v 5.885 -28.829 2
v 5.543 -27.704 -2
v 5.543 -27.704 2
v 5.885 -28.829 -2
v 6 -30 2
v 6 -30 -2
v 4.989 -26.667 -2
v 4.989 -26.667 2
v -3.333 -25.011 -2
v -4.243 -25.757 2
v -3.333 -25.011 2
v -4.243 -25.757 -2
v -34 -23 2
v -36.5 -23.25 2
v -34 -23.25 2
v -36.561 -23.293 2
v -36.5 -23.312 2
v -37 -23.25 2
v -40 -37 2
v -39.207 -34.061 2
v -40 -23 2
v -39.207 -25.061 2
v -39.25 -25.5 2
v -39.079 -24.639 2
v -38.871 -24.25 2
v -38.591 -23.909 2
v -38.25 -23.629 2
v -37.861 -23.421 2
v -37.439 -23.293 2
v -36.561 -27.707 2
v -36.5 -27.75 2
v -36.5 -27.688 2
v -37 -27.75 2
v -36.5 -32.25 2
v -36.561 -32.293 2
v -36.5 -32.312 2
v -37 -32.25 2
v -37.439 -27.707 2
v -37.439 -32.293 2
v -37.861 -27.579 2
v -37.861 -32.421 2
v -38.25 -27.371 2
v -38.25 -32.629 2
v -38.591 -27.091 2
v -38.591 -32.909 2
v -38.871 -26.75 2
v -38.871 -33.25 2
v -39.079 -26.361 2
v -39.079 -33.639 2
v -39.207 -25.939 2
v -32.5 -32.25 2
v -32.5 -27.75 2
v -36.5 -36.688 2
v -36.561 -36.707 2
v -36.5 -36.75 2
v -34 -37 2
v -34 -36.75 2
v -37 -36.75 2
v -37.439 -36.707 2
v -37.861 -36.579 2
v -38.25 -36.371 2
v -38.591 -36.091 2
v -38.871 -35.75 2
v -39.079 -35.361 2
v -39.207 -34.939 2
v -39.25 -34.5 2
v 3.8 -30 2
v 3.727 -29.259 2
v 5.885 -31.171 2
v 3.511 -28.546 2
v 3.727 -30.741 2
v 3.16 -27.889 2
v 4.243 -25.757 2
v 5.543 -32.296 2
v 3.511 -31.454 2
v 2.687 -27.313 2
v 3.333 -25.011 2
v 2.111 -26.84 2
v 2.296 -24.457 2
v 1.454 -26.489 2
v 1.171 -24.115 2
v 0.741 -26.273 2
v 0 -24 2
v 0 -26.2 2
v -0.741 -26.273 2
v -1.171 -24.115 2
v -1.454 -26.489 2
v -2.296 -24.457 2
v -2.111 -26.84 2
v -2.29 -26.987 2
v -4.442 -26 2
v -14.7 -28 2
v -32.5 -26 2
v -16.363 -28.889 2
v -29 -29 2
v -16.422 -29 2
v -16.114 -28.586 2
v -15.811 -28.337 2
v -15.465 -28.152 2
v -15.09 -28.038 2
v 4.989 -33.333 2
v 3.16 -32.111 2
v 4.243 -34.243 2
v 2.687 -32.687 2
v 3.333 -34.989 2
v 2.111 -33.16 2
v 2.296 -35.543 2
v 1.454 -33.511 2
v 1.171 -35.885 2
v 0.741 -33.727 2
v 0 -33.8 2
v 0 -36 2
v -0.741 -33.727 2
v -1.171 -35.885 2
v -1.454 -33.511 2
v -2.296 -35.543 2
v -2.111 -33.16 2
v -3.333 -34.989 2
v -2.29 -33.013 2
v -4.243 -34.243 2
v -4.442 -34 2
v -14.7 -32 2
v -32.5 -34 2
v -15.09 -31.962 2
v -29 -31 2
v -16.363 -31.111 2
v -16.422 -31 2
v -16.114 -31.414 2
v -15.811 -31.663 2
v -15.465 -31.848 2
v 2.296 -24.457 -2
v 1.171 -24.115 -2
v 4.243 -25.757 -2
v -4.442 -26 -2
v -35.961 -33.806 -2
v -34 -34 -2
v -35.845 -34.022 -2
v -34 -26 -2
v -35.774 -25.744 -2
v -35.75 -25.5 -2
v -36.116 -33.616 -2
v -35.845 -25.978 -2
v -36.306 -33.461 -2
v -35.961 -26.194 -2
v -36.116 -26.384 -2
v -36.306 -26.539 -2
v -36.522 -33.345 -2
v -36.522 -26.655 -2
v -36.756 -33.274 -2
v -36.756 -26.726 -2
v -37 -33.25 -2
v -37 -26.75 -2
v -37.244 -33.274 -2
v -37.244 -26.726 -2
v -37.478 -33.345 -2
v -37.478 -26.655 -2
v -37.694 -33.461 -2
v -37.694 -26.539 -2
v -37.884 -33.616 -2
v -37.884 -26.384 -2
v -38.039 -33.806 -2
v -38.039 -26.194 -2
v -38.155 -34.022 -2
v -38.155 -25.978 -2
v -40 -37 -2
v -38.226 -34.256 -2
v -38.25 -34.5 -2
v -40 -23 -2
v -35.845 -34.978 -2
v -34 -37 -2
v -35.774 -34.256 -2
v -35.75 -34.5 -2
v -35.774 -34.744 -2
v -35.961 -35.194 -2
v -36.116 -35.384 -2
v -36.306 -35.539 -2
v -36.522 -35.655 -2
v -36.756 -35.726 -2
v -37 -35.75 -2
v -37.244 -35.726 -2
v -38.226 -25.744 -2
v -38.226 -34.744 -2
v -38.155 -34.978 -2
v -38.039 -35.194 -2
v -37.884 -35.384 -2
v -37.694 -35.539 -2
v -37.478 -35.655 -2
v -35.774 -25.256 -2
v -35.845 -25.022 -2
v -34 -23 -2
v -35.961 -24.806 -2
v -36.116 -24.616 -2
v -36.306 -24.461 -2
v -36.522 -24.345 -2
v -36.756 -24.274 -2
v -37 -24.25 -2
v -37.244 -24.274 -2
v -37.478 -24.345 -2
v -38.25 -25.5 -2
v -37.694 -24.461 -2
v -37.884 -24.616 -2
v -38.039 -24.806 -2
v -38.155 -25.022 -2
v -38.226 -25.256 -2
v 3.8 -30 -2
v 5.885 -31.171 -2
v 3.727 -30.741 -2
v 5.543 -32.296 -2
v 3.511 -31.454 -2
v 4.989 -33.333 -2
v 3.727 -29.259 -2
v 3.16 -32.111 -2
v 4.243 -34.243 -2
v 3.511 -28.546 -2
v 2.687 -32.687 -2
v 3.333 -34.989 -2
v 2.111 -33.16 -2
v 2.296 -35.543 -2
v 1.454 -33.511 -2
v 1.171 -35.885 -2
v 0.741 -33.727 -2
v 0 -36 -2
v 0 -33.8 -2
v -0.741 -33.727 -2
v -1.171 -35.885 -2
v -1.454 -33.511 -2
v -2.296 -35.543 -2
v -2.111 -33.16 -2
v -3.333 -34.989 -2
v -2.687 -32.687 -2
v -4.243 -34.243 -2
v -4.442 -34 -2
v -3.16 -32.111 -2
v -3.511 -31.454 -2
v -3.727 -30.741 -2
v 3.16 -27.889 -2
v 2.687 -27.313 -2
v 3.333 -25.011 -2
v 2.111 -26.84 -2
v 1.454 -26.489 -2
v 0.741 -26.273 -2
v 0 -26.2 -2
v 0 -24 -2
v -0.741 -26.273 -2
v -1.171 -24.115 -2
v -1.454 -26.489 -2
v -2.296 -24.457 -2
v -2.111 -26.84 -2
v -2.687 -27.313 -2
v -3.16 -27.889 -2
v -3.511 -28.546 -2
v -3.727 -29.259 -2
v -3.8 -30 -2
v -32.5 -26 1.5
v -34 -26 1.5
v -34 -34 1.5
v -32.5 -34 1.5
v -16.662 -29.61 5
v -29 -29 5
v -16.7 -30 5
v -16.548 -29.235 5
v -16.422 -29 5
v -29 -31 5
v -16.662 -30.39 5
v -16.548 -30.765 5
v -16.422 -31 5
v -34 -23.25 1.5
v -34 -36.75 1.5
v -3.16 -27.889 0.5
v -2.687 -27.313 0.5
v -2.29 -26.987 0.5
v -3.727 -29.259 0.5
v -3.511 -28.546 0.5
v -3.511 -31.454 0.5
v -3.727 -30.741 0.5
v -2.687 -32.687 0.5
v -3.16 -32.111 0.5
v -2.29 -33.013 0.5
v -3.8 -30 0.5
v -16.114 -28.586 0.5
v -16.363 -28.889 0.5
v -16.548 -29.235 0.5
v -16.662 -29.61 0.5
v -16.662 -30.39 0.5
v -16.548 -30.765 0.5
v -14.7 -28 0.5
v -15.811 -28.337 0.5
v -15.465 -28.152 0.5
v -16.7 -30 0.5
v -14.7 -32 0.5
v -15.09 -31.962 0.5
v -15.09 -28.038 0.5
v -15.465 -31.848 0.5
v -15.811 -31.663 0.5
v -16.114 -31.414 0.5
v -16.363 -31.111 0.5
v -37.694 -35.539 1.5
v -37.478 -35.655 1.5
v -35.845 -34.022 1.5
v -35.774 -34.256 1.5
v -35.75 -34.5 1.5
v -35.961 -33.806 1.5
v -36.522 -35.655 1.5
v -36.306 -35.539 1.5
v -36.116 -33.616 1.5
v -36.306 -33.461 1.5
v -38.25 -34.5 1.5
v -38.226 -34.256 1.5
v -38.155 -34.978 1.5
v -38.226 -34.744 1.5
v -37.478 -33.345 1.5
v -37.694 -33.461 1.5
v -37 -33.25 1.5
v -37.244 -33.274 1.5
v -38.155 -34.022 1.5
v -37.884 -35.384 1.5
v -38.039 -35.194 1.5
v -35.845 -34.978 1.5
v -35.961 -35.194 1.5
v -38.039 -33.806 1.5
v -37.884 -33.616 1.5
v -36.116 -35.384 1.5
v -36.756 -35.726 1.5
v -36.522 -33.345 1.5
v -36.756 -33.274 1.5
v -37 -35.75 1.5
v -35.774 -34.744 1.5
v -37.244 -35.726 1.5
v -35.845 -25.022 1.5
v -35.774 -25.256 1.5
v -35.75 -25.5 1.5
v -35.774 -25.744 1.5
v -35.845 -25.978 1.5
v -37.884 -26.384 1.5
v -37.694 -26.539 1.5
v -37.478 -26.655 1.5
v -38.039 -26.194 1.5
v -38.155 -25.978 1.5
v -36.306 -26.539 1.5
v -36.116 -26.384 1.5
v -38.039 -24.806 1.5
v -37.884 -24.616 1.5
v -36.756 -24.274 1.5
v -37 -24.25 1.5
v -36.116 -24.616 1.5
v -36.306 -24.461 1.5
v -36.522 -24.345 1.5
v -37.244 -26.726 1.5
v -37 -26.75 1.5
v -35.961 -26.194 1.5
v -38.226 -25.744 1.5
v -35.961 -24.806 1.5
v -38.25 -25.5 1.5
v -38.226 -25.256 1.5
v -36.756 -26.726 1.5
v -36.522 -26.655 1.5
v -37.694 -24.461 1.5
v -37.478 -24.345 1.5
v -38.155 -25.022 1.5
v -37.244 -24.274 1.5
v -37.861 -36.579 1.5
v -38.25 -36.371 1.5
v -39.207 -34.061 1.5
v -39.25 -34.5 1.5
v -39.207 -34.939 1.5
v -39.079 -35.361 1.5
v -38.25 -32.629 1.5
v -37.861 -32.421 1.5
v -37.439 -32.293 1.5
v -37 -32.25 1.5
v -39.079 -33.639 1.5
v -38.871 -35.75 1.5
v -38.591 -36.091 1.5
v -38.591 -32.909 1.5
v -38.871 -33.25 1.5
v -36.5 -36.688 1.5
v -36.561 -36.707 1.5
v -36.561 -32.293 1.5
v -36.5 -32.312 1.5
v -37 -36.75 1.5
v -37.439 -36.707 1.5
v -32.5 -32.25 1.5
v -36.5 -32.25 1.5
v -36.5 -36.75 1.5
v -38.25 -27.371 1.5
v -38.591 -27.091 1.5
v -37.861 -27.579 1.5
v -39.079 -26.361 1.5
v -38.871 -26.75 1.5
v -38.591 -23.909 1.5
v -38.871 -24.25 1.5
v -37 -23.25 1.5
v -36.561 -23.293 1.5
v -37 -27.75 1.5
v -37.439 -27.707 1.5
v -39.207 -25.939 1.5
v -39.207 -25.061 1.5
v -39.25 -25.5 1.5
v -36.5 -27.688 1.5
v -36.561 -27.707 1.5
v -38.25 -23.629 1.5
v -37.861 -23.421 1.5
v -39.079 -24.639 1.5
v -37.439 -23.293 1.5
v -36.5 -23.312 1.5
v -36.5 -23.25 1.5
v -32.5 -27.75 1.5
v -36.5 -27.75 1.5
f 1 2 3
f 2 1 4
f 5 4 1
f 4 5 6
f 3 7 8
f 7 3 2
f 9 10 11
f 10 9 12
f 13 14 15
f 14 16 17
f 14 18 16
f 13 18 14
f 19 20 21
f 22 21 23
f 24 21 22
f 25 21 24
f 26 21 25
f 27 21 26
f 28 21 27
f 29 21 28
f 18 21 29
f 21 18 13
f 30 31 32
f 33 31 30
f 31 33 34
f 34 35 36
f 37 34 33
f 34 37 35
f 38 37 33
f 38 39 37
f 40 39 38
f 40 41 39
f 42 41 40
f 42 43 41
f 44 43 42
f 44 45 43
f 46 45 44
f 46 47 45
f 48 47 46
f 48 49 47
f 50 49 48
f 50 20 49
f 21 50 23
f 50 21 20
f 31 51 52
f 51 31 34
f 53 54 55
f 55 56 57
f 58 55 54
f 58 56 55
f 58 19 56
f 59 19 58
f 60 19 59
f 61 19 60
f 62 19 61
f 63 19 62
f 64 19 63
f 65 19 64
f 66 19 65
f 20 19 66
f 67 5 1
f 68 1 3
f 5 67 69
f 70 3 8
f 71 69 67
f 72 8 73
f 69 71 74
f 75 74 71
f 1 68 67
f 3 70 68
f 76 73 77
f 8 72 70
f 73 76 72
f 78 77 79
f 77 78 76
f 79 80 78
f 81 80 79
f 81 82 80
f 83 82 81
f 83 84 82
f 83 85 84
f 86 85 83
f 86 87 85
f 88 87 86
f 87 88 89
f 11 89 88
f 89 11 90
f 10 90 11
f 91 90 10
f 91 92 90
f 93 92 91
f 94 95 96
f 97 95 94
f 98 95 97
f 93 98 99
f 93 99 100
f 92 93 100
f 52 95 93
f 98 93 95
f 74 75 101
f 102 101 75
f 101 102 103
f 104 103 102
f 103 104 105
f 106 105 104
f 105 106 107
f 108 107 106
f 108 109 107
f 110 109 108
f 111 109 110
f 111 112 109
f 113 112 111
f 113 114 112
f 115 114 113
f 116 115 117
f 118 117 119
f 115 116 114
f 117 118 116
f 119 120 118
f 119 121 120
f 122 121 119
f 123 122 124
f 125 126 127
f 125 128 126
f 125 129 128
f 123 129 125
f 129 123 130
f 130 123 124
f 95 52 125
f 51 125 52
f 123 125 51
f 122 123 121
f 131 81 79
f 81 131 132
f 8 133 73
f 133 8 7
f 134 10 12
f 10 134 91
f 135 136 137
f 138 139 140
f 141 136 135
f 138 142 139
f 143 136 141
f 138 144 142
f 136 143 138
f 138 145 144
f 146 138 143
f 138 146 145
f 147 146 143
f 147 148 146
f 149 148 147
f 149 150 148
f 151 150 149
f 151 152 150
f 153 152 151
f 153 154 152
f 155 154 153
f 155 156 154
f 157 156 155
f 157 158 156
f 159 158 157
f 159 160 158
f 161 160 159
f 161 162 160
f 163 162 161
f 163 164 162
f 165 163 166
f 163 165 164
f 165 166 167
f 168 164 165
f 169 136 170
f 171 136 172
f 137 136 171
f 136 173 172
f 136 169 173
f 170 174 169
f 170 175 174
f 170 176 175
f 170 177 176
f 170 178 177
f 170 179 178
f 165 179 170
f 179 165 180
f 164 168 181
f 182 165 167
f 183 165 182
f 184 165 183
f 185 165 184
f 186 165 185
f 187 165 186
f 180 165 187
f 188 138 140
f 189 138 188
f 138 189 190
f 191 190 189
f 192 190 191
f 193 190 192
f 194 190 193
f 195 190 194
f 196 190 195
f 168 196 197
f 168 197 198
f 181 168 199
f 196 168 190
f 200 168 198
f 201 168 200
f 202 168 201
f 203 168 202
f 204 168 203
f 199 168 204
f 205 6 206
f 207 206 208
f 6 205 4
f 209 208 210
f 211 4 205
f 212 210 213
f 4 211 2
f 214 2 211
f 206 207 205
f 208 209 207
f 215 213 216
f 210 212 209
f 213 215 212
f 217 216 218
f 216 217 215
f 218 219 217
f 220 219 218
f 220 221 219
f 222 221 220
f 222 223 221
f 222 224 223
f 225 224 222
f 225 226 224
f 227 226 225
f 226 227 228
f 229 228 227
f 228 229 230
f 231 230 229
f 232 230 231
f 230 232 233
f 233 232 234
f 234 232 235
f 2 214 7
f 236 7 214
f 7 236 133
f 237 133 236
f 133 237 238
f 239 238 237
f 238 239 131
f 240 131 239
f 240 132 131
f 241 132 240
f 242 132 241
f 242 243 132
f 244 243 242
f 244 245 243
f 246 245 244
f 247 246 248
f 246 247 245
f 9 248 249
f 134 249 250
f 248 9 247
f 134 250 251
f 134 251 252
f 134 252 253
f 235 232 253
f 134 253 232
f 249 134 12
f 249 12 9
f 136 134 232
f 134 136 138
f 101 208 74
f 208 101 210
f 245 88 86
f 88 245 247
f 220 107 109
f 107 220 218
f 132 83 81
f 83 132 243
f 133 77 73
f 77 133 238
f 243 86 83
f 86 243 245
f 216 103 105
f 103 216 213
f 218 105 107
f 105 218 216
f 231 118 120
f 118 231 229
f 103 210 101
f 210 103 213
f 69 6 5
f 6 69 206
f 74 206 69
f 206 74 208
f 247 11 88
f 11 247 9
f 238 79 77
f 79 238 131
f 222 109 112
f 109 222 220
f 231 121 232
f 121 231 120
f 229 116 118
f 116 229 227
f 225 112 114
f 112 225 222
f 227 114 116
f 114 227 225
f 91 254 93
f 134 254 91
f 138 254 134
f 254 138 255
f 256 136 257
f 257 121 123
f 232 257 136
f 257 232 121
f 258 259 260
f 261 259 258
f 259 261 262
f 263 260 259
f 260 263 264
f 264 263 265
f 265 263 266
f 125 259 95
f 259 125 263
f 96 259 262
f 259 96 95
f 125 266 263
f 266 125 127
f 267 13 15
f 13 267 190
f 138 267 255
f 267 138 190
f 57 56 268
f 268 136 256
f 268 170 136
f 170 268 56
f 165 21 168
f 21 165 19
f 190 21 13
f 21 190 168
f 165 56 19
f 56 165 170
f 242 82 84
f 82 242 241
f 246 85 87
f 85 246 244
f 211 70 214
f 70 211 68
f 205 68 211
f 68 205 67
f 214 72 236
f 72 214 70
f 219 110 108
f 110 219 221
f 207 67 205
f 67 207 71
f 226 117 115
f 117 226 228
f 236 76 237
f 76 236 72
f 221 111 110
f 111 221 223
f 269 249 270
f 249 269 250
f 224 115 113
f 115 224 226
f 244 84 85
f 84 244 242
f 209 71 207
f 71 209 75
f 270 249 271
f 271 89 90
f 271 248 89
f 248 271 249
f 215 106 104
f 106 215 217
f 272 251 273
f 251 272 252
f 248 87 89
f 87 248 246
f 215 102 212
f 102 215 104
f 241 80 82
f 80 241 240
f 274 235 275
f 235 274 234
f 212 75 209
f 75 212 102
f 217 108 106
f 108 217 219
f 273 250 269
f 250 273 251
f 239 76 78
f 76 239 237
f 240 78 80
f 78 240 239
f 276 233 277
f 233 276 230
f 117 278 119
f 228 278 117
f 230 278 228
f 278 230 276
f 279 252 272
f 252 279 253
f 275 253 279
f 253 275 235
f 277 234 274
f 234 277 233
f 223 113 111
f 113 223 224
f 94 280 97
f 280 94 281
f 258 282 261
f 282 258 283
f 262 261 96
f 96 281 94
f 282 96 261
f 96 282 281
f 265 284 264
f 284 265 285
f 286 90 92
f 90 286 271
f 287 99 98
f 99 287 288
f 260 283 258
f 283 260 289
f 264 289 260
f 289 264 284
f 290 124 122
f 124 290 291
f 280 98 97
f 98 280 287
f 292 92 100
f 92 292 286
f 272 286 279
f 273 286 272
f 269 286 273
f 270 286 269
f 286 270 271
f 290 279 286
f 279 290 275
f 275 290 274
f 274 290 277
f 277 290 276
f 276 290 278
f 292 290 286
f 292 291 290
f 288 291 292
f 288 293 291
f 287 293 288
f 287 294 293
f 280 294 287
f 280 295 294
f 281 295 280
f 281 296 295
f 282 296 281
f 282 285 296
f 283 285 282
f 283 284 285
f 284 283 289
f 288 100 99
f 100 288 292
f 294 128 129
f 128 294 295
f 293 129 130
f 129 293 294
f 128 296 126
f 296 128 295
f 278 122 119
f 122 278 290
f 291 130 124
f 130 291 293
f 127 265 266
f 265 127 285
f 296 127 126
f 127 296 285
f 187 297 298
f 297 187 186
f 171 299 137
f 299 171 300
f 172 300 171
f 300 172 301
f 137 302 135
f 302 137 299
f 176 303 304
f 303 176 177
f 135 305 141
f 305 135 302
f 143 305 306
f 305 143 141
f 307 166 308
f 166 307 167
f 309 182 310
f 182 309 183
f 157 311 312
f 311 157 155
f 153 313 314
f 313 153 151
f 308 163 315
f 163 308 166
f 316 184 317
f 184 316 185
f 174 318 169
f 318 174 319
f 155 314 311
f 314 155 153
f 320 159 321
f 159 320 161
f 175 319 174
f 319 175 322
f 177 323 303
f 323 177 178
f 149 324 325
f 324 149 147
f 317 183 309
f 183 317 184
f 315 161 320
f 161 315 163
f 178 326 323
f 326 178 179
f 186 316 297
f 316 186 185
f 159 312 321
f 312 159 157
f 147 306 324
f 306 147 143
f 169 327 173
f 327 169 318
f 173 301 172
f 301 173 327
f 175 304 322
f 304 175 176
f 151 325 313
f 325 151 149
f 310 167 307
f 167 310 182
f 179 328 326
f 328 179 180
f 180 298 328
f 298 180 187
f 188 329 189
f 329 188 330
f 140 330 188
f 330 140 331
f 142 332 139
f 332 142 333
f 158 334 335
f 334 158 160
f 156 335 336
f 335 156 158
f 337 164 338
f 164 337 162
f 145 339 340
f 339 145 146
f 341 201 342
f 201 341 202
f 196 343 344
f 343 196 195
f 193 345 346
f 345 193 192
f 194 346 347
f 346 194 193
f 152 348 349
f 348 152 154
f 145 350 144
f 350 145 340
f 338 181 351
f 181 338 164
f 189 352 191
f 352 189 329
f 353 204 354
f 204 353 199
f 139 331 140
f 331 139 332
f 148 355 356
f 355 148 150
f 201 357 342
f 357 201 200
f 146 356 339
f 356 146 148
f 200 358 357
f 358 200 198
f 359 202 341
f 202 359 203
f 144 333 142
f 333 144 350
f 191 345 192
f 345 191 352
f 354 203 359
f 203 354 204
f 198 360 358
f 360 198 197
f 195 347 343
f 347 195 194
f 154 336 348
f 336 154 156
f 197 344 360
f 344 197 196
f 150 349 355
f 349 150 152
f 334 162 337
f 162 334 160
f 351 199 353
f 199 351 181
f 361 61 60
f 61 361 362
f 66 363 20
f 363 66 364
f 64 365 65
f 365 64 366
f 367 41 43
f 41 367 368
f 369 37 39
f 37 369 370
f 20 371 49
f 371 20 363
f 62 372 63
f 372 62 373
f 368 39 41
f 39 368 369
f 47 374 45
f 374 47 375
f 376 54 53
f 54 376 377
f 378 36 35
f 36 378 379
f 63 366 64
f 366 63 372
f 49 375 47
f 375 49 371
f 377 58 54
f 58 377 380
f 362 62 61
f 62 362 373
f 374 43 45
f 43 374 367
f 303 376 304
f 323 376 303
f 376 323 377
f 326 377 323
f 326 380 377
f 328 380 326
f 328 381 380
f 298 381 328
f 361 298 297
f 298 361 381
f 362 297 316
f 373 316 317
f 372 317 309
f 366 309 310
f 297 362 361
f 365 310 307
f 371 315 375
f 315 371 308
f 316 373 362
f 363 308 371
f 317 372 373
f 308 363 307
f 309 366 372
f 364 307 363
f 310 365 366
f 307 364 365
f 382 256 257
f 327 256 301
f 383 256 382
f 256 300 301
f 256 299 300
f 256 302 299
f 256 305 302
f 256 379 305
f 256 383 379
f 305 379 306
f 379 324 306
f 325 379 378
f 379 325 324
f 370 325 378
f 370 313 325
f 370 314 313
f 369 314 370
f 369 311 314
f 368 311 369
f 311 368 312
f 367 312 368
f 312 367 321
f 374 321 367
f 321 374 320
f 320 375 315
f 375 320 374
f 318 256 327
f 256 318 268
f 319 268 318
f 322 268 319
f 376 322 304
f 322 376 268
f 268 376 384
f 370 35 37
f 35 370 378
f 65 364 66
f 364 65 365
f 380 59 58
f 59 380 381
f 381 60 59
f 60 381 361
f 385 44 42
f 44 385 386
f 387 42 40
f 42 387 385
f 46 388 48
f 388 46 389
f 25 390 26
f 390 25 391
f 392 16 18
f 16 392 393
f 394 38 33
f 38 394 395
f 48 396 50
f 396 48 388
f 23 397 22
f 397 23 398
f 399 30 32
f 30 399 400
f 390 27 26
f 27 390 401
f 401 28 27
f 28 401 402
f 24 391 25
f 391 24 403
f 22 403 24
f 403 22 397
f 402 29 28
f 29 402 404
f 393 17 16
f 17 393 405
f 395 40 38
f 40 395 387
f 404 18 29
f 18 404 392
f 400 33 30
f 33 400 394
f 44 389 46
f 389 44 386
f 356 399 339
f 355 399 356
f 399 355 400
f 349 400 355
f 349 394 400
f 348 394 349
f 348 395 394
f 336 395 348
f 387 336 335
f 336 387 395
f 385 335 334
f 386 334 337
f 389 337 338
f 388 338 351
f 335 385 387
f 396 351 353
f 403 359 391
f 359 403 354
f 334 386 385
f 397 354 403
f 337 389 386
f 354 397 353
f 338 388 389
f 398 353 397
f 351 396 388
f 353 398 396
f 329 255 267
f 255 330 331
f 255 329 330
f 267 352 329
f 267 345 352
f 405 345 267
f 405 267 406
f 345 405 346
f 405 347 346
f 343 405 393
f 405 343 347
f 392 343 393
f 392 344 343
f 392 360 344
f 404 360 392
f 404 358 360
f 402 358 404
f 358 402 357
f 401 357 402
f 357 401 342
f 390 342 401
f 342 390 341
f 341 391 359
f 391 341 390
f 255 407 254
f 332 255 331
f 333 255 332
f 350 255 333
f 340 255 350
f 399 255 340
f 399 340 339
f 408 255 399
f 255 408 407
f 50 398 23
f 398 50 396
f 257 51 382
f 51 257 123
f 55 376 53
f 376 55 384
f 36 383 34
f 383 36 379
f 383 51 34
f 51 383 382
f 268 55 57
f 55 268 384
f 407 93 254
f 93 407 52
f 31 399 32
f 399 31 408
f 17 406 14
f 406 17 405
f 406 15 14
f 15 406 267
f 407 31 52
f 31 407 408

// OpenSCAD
//-- limit switch holder / servo arm extender for Auto Bed Leveling
//-- by AndrewBCN - Barcelona, Spain - November 2014
//-- GPLV3
//-- (armv3 below)

//-- remix of Thingiverse #167430 (armv1 below)
//-- by zennmaster

//-- remix of Thingiverse #209384 (armv2 below)
//-- by Stephen Castello

// Some measurements and features

// armv1 has a (fixed) length of 37mm,
// width is 10mm, thickness is 4mm,
// uses 2 x M2.5 screws and nuts to hold a small limit switch.
// Uses standard 9G microservo.

// armv2 is for a much larger limit switch and also
// apparently for a larger servo, although everything seems
// to be configurable. Default thickness is 5mm.
// Uses M3 screws and nuts to hold the limit switch.

// armv3 has a parametric length (default is 37mm), uses
// a T-profile with 4mm base thickness to avoid flexing,
// holds the small limit switch with either 2 x small M2.5
// screws and nuts or a nylon tie.
// Uses standard 9G microservo.
// The slot for the servo arm is properly shaped.


// arm body length, add approximately 8mm for total length
// i.e. with an arm length of 37mm, the distance between
// the servo center and the tip of the limit switch is 45mm

// Configure according to your extruder dimensions
arm_length=37; // [30:70]

module armv3() {
    difference() {
      // body
      union() {
      cylinder(r=6, h=4,center=true,$fn=32);
      translate([-arm_length/2,0,0]) cube([arm_length,8,4],center=true);
      // reinforcement
      translate([-arm_length/2,0,3]) cube([arm_length-16,2,4],center=true);
      // limit switch base
      translate([-arm_length,0,0]) cube([6,14,4],center=true);
      }
      
    // hole for servo spindle
    cylinder(r=3.8,h=10,center=true,$fn=32); 

    // slot for servo arm
    hull() {
      translate([0,0,5.5]) cylinder(r=3.2,h=10,center=true,$fn=32);
      translate([-14.7,0,5.5]) cylinder(r=2,h=10,center=true,$fn=32);
    }
    
    // holes for nylon tie or M2.5 screws holding limit switch
    translate([-arm_length,-4.5,0]) cylinder(r=1.25,h=10,center=true,$fn=32);
    translate([-arm_length,4.5,0]) cylinder(r=1.25,h=10,center=true,$fn=32);
    
    // some limit switches will fit better with this
    translate([-arm_length,-4.5,4]) cylinder(r=2.25,h=5,center=true,$fn=32);
    translate([-arm_length,4.5,4]) cylinder(r=2.25,h=5,center=true,$fn=32);    
    translate([-arm_length+2.5,-4.5,4]) cube([4,4.5,5],center=true);
    translate([-arm_length+2.5,4.5,4]) cube([4,4.5,5],center=true);    
    }
}


module armv1() {
  difference(){
    union(){
      difference(){
	roundedBox([10,37,4],4,true); //main body
	translate([0,0,3])
	  roundedBox([4.8,28,5],2.4,true);  //slot for servo arm
	translate([0,-12.5,-5])
	cylinder(r=3.75,h=10, $fn=30); //  Hole for servo spindle
      }

      translate([0,16.5,0])
      roundedBox([20,5,4],1.75,true); // Microswtich mount body
    }
    translate([0,16.5,-1])
    roundedBox([16,2.8,10],1.4,true);  // slot for mounting screws
  }
}

module armv2() {
  //////////////////////////////////////////////////////////////////////////////////////////////////
  // Created on 12/13/2013 by Stephen Castello
  // Last update: 2/22/2014
  // changed thickness to 5mm (4mm flexed alot)
  //////////////////////////////////////////////////////////////////////////////////////////////////
  // variables
  //////////////////////////////////////////////////////////////////////////////////////////////////
  Z_Rod_dia=10;				// diameter of Z rod
  Screw_dia=3.2;				// clamp screw diameter
  Screw_Thread_dia=2.5;		// screw hole diameter to make a 3mm threaded hole
  Switch_ht=15;				// height of holder
  Switch_thk = 5;				// thickness of holder
  Switch_hole_sep=22;		// distance between holes for switch (19 for mechanical endstop v1.2)
  Switch_hole_offset = 10;		// switch hole offest (mech endstop v1.2 doesn't have one)
  Nut_wrench_size = 5.5;		// wrench size of nut
  Nut_depth = 2.3;			// thickness of nut
  Nylok_depth = 4;			// thickness of nylok nut
  Lever_wd = 12;				// width of lever
  Lever_ht = 33;				// lever length
  Servo_dia = 8.2;			// outside diameter of servo lever
  //////////////////////////////////////////////////////////////////////////////////////////////////
  // make the parts
  //////////////////////////////////////////////////////////////////////////////////////////////////

  rotate([0,-90,0]) {
	  switch_side(0); // switch off to right == 1
	  lever();
  }

  //////////////////////////////////////////////////////////////////////////////////////////////////
  // modules for each part
  //////////////////////////////////////////////////////////////////////////////////////////////////

  module switch_side(Right) { // riser for switch
	  if(Right) {
		  difference() {
			  difference() {
				  difference() {
					  cube([Switch_thk,29,Switch_ht],false);
					  // screw holes for switch
					  rotate(a=[0,90,0]) {		
						  translate([-(Switch_ht-2.5), 4, 0]) {
							  cylinder(h = 11, r = Screw_dia/2, center = false, $fn=100);
						  }
					  }
					  rotate(a=[0,90,0]) {
						  translate(v = [-(Switch_ht-2.5)+Switch_hole_offset, 4+Switch_hole_sep, 0]) {
						  cylinder(h = 11, r = Screw_dia/2, center = false, $fn=100);
						  }
					  }
				  }
			  }
		  }
		  translate([0,12,11]) rotate([45,0,0]) cube([Switch_thk,5,5],false); // gusset
	  } else {
		  difference() {
			  difference() {
				  translate([0,-17,0]) {
					  difference() {
						  cube([Switch_thk,29,Switch_ht],false);
						  // screw holes for switch
						  rotate(a=[0,90,0]) {		
							  translate([-(Switch_ht-2.5)+Switch_hole_offset, 4, 0]) {
								  cylinder(h = 11, r = Screw_dia/2, center = false, $fn=100);
							  }
						  }
						  rotate(a=[0,90,0]) {
							  translate(v = [-(Switch_ht-2.5), 4+Switch_hole_sep, 0]) {
							  cylinder(h = 11, r = Screw_dia/2, center = false, $fn=100);
							  }
						  }
					  }
				  } // translate
			  }
		  }
		  translate([0,0,11]) rotate([45,0,0]) cube([Switch_thk,5,5],false); // gusset
	  }
  }

  //////////////////////////////////////////////////////////////////////////////////////////////////////////////

  module lever() {  // servo lever
	  difference() {
		  hull() {
			  translate([0,0,15]) cube([Switch_thk,Lever_wd,Lever_ht-5],false); // lever with a rounded end
			  translate([0,6,Lever_ht + 10.5]) rotate([0,90,0]) cylinder(h=Switch_thk,r=Lever_wd/2,$fn=50);
		  }
		  translate([2.6,3,15]) cube([Switch_thk/2,Lever_wd/2,Lever_ht-5],false); // groove
		  translate([-5,6,Lever_ht + 10]) rotate([0,90,0]) cylinder(h=20,r=Servo_dia/2,$fn=50); // servo arm hole
		  //notch_lever();  // added countersinks instead
	  }
  }

  //////////////////////////////////////////////////////////////////////////////////////////////////////////////

  module notch_lever()
  {
	  difference() { // space for servo mounting screw
		  hull() {   // must be adjusted if size is changed *************************************************************
			  translate([-1,15,35]) rotate([90,0,0]) cylinder(h=20,r=2,$fn=50);
			  translate([-1,23,50]) rotate([135,0,0]) cylinder(h=20,r=2,$fn=50);
			  translate([-1,3,36]) rotate([45,0,0]) cylinder(h=20,r=2,$fn=50);
		  }
		  translate([-1,6,47]) {
			  rotate([0,90,0]) minkowski() {
				  cube([Lever_wd-4,Switch_thk-4,Lever_ht], true);
				  cylinder(r=6,h=1,$fn=100);
			  }
		  }
	  }
  }

  //////////////////////end of Z stop servo mount.scad /////////////////////////////////////////////////
}

/*include <boxes.scad>; // required only by armv1
armv1();
translate([30,30,0]) armv2(); */
// print the part
translate([0,-30,0]) armv3();
